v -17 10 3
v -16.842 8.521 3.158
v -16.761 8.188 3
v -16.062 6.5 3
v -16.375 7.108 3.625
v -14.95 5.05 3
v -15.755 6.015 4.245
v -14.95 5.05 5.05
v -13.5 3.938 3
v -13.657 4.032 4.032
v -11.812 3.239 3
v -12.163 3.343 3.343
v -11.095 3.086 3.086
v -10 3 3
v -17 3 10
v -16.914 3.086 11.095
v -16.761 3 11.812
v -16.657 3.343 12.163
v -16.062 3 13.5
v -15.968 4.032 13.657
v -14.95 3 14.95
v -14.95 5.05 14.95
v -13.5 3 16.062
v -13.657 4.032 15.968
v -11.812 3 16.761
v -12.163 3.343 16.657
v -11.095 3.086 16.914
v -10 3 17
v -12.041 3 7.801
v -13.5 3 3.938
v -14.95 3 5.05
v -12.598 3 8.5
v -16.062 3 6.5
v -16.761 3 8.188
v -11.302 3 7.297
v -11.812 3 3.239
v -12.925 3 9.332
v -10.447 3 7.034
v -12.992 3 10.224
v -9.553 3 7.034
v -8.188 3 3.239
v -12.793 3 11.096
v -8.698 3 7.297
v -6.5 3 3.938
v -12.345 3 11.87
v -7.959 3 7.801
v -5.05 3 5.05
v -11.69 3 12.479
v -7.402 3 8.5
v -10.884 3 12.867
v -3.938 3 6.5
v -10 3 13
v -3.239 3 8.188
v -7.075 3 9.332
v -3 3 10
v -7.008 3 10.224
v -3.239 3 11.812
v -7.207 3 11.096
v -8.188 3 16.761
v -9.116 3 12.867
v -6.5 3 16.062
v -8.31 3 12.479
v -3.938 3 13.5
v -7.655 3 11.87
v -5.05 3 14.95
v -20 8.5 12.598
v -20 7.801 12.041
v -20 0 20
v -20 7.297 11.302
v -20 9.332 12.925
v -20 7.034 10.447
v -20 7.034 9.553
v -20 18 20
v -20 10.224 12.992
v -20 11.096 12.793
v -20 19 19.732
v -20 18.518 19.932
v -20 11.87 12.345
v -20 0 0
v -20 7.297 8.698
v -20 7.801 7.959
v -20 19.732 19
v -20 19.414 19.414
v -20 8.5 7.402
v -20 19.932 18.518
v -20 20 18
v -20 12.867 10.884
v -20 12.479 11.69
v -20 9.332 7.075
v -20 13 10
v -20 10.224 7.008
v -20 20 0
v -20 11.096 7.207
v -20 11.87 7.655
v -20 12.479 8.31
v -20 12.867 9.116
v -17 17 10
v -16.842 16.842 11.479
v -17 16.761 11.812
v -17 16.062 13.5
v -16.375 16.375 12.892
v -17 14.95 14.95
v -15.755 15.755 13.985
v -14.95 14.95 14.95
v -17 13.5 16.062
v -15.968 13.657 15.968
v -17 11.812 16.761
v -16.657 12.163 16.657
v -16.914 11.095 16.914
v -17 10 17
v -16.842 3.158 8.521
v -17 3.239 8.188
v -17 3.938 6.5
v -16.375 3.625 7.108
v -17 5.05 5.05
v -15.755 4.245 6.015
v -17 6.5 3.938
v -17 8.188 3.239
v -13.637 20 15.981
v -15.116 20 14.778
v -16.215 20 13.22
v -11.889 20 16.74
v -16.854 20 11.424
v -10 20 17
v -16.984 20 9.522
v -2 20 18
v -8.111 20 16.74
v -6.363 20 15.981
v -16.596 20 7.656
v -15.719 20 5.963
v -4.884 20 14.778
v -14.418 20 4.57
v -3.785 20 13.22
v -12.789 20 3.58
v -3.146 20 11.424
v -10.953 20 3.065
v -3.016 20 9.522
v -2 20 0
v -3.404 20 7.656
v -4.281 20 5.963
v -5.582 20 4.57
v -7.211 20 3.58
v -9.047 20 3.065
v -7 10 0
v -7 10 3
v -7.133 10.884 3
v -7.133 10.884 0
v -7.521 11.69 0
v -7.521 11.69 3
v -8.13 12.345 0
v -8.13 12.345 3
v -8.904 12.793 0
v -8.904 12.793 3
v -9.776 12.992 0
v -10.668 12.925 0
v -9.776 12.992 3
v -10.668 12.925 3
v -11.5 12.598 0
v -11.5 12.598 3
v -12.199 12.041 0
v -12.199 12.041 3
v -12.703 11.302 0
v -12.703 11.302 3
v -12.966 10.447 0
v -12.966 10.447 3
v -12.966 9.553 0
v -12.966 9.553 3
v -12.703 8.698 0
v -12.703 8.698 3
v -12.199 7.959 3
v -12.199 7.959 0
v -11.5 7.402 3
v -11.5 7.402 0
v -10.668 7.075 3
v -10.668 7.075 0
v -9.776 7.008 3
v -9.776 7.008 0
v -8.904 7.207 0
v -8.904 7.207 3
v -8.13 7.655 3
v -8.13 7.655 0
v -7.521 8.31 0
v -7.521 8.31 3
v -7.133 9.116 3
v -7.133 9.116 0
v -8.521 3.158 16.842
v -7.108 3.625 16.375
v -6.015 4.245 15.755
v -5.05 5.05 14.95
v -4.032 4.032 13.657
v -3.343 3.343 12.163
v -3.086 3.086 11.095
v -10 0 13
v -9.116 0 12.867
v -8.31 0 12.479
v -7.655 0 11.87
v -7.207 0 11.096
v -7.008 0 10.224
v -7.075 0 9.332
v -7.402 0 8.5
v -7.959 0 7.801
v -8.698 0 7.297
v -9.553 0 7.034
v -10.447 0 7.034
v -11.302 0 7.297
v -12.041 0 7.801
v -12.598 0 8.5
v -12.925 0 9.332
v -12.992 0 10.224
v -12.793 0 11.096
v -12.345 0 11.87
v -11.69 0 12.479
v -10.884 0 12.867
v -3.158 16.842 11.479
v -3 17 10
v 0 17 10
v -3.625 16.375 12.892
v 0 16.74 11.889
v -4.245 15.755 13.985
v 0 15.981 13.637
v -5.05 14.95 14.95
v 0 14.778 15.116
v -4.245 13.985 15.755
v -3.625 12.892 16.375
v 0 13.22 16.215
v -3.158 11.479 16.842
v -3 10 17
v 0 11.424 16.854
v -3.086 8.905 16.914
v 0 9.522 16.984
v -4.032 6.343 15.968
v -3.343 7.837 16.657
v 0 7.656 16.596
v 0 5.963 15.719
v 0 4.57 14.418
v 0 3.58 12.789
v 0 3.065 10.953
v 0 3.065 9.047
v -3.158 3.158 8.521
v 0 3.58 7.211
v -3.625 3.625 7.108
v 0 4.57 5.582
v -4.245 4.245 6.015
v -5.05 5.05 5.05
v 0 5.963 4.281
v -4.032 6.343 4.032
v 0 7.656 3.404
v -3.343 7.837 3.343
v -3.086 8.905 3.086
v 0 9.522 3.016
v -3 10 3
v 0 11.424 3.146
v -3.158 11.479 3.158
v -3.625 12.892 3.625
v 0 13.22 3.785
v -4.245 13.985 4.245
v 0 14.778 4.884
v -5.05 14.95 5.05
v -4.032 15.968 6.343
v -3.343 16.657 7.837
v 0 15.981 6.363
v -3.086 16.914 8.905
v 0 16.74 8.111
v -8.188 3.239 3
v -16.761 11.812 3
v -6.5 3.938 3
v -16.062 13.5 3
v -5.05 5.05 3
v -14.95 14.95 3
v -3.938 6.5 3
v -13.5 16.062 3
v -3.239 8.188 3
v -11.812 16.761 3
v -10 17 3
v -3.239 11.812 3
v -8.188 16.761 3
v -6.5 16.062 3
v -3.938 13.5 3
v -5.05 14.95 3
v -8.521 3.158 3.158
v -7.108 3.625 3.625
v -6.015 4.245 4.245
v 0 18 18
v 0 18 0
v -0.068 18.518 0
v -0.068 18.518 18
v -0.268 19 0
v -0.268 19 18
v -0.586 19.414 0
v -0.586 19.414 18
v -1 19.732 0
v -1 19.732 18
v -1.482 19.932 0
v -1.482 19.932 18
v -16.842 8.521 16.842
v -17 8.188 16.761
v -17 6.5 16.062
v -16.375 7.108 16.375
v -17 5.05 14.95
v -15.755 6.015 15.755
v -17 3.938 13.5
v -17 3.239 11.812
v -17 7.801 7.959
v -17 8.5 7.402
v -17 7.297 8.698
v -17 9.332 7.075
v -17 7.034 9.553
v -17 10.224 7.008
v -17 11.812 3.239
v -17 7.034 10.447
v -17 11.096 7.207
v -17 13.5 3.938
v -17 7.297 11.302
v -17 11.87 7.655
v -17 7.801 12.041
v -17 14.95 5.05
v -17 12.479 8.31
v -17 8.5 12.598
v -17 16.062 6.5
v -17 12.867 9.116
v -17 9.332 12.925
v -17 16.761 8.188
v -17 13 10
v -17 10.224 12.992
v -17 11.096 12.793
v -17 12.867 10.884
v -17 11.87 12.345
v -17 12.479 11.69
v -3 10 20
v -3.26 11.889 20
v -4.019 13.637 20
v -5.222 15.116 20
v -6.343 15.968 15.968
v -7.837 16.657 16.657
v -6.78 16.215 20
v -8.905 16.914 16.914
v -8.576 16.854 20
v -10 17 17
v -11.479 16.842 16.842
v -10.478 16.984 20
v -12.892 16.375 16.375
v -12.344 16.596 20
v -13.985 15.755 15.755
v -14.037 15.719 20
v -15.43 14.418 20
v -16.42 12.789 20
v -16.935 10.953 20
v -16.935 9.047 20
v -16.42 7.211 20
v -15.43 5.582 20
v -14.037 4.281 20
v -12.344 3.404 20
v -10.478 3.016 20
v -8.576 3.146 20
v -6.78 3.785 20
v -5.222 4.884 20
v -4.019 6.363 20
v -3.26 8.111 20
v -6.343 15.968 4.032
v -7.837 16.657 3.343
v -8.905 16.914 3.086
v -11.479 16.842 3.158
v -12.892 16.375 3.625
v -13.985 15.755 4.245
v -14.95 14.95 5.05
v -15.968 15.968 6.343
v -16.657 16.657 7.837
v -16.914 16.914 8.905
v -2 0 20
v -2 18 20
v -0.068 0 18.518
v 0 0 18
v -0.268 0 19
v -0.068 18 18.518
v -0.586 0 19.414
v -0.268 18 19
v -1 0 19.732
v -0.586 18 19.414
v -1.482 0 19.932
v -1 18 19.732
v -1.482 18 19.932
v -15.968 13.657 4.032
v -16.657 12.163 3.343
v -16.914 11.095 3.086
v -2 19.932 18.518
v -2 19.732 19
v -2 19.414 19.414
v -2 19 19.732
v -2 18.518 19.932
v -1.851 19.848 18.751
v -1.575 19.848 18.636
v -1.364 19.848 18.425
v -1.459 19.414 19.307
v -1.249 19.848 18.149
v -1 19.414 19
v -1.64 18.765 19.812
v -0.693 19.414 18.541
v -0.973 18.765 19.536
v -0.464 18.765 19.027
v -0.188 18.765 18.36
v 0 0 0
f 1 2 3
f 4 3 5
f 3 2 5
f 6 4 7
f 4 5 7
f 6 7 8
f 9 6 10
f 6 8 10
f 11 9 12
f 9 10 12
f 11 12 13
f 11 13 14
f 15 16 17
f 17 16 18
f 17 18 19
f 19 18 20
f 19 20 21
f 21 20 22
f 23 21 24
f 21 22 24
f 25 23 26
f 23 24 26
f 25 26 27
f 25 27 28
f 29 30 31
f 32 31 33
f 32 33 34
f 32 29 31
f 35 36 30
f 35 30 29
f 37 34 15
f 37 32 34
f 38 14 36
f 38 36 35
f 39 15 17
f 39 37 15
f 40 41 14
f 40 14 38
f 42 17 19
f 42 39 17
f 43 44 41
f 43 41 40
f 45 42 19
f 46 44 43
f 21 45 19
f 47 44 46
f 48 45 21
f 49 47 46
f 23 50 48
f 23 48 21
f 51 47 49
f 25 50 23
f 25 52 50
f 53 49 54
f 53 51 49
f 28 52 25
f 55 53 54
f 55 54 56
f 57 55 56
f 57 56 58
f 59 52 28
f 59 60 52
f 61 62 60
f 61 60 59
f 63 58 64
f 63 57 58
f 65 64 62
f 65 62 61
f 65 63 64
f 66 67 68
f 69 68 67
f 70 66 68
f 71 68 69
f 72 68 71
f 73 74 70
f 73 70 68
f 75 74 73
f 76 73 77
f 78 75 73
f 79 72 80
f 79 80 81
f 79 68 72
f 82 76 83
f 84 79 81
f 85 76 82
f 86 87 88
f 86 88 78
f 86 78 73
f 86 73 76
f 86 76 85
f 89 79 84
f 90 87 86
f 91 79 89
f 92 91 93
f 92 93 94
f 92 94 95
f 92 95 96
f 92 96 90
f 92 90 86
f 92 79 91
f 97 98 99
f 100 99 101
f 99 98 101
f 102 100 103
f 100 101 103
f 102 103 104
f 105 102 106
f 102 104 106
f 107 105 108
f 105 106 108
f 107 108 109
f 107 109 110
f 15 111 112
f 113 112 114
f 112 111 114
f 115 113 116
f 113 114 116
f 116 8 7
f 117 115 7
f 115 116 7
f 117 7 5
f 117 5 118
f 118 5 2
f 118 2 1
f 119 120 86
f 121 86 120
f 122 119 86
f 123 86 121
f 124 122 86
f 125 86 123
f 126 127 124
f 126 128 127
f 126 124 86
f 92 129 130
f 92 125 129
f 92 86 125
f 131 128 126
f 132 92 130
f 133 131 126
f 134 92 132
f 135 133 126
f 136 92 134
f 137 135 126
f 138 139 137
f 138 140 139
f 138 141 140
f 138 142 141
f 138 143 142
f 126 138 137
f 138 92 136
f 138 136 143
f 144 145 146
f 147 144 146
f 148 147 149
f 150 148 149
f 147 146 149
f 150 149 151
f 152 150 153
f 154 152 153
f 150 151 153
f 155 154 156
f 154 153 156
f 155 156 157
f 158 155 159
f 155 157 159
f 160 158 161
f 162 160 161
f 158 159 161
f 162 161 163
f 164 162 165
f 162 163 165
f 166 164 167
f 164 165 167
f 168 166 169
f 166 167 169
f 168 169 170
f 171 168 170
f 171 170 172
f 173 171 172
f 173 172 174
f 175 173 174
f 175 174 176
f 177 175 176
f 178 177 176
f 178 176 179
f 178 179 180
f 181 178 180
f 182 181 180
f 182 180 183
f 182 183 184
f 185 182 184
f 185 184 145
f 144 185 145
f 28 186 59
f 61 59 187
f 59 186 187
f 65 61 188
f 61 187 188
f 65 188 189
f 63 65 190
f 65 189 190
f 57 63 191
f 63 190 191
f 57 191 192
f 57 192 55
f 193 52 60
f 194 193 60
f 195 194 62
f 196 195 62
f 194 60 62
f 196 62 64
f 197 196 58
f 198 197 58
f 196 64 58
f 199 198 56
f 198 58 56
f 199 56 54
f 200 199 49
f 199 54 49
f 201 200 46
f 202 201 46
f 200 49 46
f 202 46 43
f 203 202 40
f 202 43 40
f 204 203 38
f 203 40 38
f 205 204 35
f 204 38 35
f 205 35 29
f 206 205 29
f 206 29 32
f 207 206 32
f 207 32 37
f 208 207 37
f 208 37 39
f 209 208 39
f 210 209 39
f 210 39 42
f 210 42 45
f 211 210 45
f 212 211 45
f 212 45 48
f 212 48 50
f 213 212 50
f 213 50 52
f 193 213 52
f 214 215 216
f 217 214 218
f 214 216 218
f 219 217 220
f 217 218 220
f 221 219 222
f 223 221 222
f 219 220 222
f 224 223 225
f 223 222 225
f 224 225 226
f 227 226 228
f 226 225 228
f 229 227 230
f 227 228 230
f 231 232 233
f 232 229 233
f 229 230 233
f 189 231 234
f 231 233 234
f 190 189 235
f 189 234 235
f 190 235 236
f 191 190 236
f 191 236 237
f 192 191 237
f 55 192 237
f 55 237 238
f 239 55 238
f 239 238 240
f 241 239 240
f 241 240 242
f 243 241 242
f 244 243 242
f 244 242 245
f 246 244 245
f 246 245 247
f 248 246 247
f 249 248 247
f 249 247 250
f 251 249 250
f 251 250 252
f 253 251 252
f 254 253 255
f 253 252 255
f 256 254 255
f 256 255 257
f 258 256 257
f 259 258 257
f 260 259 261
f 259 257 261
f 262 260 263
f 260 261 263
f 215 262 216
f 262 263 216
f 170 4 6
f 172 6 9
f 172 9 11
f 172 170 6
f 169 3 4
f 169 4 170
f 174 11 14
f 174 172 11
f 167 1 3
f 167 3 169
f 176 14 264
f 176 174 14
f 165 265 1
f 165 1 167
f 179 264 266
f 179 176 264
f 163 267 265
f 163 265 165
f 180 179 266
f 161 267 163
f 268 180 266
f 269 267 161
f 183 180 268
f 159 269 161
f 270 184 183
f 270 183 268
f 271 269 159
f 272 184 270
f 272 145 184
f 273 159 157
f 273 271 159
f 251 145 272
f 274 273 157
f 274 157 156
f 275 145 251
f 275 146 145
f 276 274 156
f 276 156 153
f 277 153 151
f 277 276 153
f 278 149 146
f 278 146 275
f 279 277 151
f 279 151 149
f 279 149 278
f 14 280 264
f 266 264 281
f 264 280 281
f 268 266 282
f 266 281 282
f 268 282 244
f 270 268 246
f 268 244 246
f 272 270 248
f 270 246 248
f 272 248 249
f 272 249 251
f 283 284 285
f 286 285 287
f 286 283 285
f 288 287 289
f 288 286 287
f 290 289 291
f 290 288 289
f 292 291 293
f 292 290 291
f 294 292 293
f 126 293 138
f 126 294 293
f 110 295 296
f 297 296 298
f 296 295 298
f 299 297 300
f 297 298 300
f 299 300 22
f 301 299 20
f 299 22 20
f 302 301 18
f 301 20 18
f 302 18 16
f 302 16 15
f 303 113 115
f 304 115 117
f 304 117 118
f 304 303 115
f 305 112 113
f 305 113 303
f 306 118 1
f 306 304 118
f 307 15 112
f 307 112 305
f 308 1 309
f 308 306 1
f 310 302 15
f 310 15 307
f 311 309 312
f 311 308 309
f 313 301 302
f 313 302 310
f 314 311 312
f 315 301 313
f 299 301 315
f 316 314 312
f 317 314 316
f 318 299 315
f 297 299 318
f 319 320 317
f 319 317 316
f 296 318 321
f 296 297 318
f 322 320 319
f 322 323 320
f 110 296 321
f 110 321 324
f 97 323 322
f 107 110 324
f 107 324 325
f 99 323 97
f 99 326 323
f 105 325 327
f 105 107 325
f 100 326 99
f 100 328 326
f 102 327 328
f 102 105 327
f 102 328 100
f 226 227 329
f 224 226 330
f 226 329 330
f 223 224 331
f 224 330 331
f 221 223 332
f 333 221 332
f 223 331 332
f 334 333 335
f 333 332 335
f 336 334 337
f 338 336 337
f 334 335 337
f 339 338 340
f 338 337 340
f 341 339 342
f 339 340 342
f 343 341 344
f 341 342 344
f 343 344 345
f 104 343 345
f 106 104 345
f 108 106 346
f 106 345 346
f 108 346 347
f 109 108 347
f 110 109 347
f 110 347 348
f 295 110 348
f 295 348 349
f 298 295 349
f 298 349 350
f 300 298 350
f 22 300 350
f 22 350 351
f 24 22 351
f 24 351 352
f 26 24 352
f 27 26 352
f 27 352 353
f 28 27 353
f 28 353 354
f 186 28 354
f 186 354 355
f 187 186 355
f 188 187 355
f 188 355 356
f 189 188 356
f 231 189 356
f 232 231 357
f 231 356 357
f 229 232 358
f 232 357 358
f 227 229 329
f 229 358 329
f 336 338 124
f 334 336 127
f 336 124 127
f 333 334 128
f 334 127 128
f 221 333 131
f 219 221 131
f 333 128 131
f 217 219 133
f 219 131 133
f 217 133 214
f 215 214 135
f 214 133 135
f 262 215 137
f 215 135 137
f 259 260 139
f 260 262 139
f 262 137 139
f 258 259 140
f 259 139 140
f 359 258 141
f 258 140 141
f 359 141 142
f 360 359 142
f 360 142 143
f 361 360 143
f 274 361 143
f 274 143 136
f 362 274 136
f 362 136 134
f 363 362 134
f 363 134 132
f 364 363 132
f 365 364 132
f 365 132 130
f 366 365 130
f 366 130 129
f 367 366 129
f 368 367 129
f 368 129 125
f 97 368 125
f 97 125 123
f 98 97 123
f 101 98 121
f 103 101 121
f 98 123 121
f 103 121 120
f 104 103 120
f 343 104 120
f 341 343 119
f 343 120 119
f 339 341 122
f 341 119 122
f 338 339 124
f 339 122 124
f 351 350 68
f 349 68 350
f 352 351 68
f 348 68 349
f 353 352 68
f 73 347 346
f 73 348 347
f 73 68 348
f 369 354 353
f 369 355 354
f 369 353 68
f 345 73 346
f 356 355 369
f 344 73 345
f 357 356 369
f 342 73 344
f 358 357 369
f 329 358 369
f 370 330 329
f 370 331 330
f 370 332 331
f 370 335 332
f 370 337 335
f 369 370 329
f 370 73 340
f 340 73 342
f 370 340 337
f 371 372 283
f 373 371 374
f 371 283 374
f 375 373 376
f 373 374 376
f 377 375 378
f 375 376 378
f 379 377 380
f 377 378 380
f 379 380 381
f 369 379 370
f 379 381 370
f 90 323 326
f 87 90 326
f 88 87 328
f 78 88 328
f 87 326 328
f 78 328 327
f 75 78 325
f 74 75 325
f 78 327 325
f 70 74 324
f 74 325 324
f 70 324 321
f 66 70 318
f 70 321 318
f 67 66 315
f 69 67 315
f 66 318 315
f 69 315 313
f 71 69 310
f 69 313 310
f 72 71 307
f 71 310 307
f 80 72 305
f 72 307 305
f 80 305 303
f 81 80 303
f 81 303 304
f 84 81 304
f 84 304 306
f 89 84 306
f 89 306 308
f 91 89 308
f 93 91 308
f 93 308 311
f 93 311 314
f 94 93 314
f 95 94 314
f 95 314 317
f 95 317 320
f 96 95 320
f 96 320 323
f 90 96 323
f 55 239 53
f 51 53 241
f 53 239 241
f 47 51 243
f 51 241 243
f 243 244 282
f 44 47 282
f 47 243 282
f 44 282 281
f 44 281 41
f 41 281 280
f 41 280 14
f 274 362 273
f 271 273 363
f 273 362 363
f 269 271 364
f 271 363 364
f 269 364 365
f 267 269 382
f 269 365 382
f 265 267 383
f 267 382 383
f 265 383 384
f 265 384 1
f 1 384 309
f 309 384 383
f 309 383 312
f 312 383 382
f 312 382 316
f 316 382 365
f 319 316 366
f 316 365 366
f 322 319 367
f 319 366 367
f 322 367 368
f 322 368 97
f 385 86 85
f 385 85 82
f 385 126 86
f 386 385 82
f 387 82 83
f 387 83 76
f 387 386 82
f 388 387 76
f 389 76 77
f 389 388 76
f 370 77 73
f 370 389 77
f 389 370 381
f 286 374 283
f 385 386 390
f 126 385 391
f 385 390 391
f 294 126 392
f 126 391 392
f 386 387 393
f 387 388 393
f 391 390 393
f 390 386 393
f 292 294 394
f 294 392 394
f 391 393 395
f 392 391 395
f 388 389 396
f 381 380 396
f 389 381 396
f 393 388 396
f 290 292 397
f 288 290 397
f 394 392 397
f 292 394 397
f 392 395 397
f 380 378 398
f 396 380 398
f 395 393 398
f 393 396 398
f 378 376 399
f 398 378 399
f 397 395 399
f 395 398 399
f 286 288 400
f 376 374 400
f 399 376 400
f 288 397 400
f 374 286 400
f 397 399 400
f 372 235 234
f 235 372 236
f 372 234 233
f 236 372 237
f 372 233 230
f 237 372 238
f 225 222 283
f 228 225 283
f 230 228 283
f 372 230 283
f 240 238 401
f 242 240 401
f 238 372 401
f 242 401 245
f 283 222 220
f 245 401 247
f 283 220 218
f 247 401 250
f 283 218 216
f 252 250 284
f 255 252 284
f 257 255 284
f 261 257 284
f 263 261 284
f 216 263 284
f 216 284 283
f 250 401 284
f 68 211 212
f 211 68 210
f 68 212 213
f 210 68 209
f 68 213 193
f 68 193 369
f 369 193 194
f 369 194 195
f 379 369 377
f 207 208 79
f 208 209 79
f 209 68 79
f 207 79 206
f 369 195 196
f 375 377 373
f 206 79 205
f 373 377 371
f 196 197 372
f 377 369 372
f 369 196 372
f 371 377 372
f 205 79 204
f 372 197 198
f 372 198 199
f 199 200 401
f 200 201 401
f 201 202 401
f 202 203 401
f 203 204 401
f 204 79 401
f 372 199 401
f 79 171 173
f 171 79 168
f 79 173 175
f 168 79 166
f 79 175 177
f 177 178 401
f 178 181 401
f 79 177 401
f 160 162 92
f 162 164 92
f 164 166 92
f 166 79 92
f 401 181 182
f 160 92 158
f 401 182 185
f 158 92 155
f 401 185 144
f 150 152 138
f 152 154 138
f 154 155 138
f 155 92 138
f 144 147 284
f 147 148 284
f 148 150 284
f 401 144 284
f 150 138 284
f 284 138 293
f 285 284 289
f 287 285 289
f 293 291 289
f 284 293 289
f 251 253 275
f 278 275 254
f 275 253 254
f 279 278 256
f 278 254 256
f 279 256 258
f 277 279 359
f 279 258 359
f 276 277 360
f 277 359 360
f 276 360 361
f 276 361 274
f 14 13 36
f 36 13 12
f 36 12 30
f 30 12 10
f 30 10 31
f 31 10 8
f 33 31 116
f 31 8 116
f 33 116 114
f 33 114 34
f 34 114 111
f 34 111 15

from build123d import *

# Parameters (mm, degrees)
ESQUISSE1_W             = 20
ESQUISSE1_H             = 20
BOSS_EXTRU_1_DEPTH      = 20
CONG_1_R                = 2
ESQUISSE2_R             = 3
ENL_V_MAT_EXTRU_1_DEPTH = 21
ESQUISSE3_R             = 3
ENL_V_MAT_EXTRU_2_DEPTH = 21
ESQUISSE4_R             = 3
ENL_V_MAT_EXTRU_3_DEPTH = 21
ESQUISSE5_R             = 7
ENL_V_MAT_EXTRU_4_DEPTH = 17
ESQUISSE6_R             = 7
ENL_V_MAT_EXTRU_5_DEPTH = 17
ESQUISSE7_R             = 7
ENL_V_MAT_EXTRU_6_DEPTH = 17


with BuildPart() as part:
    # Esquisse1 → Boss.-Extru.1 (new body)
    with BuildSketch(Plane.XY):
        with Locations((-10, 10)):
            Rectangle(ESQUISSE1_W, ESQUISSE1_H)
    extrude(amount=BOSS_EXTRU_1_DEPTH)

    # Congé1
    cong_1_edges = [part.edges().sort_by_distance(p)[0] for p in [
        (0, 10, 20),
        (-10, 20, 20),
        (0, 20, 10),
    ]]
    fillet(cong_1_edges, radius=CONG_1_R)

    # Esquisse2 → Enlèv. mat.-Extru.1 (cut, through all)
    with BuildSketch(Plane.XY.offset(20)):
        with Locations((-10, 10)):
            Circle(ESQUISSE2_R)
    extrude(amount=-ENL_V_MAT_EXTRU_1_DEPTH, mode=Mode.SUBTRACT)

    # Esquisse3 → Enlèv. mat.-Extru.2 (cut, through all)
    with BuildSketch(Plane(origin=(0, 0, 0), x_dir=(0, 0, -1), z_dir=(1, 0, 0))):
        with Locations(Location((-10, 10, 0), (0, 0, 90))):  # turned: the seam where the file's is
            Circle(ESQUISSE3_R)
    extrude(amount=-ENL_V_MAT_EXTRU_2_DEPTH, mode=Mode.SUBTRACT)

    # Esquisse4 → Enlèv. mat.-Extru.3 (cut, through all)
    with BuildSketch(Plane(origin=(0, 20, 0), x_dir=(-1, 0, 0), z_dir=(0, 1, 0))):
        with Locations(Location((10, 10, 0), (0, 0, 90))):  # turned: the seam where the file's is
            Circle(ESQUISSE4_R)
    extrude(amount=-ENL_V_MAT_EXTRU_3_DEPTH, mode=Mode.SUBTRACT)

    # Esquisse5 → Enlèv. mat.-Extru.4 (cut)
    with BuildSketch(Plane.XY.offset(20)):
        with Locations((-10, 10)):
            Circle(ESQUISSE5_R)
    extrude(amount=-ENL_V_MAT_EXTRU_4_DEPTH, mode=Mode.SUBTRACT)

    # Esquisse6 → Enlèv. mat.-Extru.5 (cut)
    with BuildSketch(Plane(origin=(0, 0, 0), x_dir=(0, 0, -1), z_dir=(1, 0, 0))):
        with Locations(Location((-10, 10, 0), (0, 0, 90))):  # turned: the seam where the file's is
            Circle(ESQUISSE6_R)
    extrude(amount=-ENL_V_MAT_EXTRU_5_DEPTH, mode=Mode.SUBTRACT)

    # Esquisse7 → Enlèv. mat.-Extru.6 (cut)
    with BuildSketch(Plane(origin=(0, 20, 0), x_dir=(1, 0, 0), z_dir=(0, 1, 0))):
        with Locations(Location((-10, -10, 0), (0, 0, 270))):  # turned: the seam where the file's is
            Circle(ESQUISSE7_R)
    extrude(amount=-ENL_V_MAT_EXTRU_6_DEPTH, mode=Mode.SUBTRACT)


solid = part.part
